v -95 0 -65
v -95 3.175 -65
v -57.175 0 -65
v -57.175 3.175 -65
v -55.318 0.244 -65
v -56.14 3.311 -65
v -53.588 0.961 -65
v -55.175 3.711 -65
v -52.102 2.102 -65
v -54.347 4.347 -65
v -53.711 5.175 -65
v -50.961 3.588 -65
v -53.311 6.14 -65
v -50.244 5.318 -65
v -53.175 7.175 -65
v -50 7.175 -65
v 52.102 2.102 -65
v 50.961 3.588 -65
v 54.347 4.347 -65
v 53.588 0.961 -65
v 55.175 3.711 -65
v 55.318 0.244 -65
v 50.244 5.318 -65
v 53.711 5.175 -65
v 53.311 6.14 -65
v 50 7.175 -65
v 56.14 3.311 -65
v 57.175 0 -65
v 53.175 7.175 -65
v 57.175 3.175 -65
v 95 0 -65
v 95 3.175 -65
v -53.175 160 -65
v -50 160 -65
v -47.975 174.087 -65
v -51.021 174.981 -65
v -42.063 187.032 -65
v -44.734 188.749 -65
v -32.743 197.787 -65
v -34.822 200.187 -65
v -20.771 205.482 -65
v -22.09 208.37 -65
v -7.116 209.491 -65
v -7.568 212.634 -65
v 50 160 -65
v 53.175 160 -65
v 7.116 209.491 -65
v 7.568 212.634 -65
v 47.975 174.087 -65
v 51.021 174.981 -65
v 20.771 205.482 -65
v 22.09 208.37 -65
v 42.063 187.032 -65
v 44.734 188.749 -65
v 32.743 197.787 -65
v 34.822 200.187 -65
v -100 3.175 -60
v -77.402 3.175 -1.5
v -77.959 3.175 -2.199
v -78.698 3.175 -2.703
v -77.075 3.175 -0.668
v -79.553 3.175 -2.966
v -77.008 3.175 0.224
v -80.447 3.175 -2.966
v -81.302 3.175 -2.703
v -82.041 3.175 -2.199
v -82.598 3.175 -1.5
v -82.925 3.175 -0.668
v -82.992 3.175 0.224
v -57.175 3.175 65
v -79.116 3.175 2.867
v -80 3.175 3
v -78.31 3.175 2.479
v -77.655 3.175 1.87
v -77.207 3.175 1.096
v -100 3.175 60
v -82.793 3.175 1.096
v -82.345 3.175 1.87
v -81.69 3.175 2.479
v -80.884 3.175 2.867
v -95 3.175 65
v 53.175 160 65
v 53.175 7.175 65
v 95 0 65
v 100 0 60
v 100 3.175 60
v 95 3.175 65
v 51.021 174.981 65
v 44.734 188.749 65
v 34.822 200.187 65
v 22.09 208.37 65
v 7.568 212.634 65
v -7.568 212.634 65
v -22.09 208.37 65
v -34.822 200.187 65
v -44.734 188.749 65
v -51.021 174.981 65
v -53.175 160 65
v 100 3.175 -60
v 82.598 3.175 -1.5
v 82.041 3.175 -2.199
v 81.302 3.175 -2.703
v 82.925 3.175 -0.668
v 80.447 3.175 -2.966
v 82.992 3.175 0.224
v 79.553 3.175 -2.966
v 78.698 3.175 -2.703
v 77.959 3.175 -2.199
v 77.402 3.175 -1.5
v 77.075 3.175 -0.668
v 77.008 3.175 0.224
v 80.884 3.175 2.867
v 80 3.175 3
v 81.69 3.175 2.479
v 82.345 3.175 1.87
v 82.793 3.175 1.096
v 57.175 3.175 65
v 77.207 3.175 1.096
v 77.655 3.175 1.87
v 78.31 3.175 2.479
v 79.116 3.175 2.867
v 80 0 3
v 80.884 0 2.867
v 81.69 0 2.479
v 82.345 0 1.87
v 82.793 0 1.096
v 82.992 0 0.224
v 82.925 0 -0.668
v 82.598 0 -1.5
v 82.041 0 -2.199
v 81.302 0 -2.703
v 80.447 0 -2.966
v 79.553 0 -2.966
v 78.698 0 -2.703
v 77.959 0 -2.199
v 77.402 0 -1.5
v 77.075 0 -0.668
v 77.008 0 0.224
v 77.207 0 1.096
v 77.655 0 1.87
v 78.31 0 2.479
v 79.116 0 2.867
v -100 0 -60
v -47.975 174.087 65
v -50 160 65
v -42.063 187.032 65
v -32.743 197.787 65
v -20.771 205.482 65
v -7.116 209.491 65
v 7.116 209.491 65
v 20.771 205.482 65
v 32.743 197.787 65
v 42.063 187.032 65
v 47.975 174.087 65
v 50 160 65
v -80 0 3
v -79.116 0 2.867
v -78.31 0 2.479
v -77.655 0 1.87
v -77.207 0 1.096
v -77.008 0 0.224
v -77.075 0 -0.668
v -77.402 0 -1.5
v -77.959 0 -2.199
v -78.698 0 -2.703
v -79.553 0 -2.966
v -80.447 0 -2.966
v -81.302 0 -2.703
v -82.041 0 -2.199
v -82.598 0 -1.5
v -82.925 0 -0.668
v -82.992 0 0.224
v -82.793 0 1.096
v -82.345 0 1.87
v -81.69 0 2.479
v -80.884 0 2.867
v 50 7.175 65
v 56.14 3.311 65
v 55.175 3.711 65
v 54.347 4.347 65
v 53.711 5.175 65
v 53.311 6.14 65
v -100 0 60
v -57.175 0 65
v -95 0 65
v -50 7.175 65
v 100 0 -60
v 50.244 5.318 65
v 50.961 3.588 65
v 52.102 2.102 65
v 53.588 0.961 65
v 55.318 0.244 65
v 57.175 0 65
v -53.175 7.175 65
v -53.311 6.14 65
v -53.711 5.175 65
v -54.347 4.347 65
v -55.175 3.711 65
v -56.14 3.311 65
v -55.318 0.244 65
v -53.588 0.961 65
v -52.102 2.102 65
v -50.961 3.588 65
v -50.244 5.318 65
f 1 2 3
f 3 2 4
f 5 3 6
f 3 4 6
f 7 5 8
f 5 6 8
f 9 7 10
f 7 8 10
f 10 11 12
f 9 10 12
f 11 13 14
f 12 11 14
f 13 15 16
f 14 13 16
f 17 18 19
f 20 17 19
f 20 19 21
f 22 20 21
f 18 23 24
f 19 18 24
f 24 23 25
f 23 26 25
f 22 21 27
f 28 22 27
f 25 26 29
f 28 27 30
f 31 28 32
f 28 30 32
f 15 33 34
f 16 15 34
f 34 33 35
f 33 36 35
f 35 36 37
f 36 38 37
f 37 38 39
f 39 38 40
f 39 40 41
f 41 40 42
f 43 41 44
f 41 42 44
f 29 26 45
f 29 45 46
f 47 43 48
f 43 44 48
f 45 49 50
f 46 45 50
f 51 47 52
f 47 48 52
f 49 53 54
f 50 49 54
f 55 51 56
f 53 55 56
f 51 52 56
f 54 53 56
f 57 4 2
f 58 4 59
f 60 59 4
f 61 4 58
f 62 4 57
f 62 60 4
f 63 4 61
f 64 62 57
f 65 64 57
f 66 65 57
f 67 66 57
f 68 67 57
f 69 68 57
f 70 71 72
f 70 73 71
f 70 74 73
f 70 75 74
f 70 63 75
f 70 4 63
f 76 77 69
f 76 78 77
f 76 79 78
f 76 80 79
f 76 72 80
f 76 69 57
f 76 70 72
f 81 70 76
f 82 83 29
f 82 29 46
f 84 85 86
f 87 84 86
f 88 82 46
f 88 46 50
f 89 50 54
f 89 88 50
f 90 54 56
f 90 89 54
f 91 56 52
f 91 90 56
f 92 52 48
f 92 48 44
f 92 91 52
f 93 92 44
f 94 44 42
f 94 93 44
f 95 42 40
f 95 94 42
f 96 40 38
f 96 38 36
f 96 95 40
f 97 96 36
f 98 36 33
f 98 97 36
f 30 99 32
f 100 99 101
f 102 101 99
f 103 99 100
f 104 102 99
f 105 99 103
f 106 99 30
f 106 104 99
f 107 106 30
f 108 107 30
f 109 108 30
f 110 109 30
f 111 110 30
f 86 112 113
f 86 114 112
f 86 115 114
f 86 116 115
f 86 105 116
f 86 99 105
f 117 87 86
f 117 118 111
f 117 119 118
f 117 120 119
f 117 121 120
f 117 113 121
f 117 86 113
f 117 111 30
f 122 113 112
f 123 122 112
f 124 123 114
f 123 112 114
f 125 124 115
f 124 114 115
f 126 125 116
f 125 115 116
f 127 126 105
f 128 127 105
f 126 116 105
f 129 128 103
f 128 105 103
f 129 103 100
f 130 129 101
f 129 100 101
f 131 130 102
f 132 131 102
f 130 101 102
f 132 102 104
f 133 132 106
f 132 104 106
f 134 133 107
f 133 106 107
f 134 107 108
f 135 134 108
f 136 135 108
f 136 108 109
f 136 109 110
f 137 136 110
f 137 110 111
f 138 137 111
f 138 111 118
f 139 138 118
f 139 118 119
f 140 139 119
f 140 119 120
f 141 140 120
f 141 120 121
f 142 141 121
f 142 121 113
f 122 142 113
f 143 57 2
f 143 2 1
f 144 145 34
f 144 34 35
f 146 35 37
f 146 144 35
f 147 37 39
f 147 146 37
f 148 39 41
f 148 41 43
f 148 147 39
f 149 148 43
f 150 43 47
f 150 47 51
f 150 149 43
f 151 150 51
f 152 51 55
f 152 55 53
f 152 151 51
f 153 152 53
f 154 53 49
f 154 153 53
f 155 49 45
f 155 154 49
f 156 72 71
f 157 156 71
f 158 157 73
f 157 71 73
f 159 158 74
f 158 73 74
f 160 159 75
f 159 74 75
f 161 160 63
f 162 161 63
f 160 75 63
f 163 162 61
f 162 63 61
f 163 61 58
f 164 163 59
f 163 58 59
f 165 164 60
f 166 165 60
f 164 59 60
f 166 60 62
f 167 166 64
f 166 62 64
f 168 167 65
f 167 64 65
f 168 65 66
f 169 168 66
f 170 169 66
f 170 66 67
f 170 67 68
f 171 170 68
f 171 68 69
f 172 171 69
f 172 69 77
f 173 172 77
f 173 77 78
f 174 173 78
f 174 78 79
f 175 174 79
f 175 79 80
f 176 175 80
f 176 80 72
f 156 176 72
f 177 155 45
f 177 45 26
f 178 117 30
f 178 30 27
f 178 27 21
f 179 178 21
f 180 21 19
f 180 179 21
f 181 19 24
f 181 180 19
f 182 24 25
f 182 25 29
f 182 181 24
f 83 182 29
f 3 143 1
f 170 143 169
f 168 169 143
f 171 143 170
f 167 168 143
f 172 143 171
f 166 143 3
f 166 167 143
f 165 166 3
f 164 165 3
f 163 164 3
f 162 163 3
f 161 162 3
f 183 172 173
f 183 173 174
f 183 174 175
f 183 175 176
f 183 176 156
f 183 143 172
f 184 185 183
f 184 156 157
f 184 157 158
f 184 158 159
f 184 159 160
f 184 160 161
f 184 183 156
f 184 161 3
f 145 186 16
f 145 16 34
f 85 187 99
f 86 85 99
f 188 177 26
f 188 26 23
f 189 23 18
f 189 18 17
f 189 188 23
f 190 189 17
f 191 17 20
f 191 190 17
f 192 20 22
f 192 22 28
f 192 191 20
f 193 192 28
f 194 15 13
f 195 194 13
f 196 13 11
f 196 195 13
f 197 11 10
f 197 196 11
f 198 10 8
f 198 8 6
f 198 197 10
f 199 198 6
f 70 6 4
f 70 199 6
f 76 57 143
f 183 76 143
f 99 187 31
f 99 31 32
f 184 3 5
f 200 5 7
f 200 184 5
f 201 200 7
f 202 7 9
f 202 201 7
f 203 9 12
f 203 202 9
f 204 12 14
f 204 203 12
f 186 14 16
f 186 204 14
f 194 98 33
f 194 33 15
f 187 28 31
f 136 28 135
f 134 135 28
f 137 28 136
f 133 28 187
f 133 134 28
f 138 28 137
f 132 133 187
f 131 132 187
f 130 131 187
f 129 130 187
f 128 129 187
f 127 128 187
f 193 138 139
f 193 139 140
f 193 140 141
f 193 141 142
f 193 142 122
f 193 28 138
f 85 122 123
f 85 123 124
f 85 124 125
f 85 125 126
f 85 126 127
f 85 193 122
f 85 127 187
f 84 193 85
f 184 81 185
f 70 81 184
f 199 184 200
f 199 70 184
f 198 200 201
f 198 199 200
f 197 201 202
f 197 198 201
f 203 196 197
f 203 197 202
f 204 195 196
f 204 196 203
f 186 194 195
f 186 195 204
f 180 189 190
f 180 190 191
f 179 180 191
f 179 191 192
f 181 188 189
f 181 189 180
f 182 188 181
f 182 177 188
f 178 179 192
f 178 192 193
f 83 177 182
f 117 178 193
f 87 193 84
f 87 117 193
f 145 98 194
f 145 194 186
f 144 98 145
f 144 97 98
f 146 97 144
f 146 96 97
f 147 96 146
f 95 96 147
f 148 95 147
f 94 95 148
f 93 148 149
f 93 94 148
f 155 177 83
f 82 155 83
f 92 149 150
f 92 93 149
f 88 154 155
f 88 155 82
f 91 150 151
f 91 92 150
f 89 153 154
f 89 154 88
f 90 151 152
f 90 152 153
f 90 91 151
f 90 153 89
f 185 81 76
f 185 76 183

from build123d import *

# Parameters (mm, degrees)
BASE_FLANGE1_DEPTH = 65
SKETCH6_R          = 3
CUT_EXTRUDE1_DEPTH = 10
CHAMFER1_SIZE      = 5


# Sheet-metal steps are written as plain solids
with BuildPart() as part:
    # Sketch1 → Base-Flange1 (new, symmetric)
    with BuildSketch(Plane.XY):
        with BuildLine():
            Line((-100, 0), (-57.175, 0))
            ThreePointArc((-57.175, 0), (-52.101508845, 2.101508845), (-50, 7.175))
            Line((-50, 7.175), (-50, 160))
            ThreePointArc((-50, 160), (0, 210), (50, 160))
            Line((50, 160), (50, 7.175))
            ThreePointArc((50, 7.175), (52.101508845, 2.101508845), (57.175, 0))
            Line((57.175, 0), (100, 0))
            Line((100, 0), (100, 3.175))
            Line((100, 3.175), (57.175, 3.175))
            ThreePointArc((57.175, 3.175), (54.346572875, 4.346572875), (53.175, 7.175))
            Line((53.175, 7.175), (53.175, 160))
            ThreePointArc((53.175, 160), (0, 213.175), (-53.175, 160))
            Line((-53.175, 160), (-53.175, 7.175))
            ThreePointArc((-53.175, 7.175), (-54.346572875, 4.346572875), (-57.175, 3.175))
            Line((-57.175, 3.175), (-100, 3.175))
            Line((-100, 3.175), (-100, 0))
        make_face()
    extrude(amount=BASE_FLANGE1_DEPTH, both=True)

    # Sketch6 → Cut-Extrude1 (cut)
    with BuildSketch(Plane(origin=(0, 3.175, 0), x_dir=(1, 0, 0), z_dir=(0, 1, 0))):
        with Locations(Location((80, 0, 0), (0, 0, 270))):
            Circle(SKETCH6_R)
        with Locations(Location((-80, 0, 0), (0, 0, 270))):
            Circle(SKETCH6_R)
    extrude(amount=-CUT_EXTRUDE1_DEPTH, mode=Mode.SUBTRACT)

    # Chamfer1
    chamfer1_edges = [part.edges().sort_by_distance(p)[0] for p in [
        (-100, 1.5875, -65),
        (100, 1.5875, -65),
        (-100, 1.5875, 65),
        (100, 1.5875, 65),
    ]]
    chamfer(chamfer1_edges, length=CHAMFER1_SIZE)


solid = part.part
